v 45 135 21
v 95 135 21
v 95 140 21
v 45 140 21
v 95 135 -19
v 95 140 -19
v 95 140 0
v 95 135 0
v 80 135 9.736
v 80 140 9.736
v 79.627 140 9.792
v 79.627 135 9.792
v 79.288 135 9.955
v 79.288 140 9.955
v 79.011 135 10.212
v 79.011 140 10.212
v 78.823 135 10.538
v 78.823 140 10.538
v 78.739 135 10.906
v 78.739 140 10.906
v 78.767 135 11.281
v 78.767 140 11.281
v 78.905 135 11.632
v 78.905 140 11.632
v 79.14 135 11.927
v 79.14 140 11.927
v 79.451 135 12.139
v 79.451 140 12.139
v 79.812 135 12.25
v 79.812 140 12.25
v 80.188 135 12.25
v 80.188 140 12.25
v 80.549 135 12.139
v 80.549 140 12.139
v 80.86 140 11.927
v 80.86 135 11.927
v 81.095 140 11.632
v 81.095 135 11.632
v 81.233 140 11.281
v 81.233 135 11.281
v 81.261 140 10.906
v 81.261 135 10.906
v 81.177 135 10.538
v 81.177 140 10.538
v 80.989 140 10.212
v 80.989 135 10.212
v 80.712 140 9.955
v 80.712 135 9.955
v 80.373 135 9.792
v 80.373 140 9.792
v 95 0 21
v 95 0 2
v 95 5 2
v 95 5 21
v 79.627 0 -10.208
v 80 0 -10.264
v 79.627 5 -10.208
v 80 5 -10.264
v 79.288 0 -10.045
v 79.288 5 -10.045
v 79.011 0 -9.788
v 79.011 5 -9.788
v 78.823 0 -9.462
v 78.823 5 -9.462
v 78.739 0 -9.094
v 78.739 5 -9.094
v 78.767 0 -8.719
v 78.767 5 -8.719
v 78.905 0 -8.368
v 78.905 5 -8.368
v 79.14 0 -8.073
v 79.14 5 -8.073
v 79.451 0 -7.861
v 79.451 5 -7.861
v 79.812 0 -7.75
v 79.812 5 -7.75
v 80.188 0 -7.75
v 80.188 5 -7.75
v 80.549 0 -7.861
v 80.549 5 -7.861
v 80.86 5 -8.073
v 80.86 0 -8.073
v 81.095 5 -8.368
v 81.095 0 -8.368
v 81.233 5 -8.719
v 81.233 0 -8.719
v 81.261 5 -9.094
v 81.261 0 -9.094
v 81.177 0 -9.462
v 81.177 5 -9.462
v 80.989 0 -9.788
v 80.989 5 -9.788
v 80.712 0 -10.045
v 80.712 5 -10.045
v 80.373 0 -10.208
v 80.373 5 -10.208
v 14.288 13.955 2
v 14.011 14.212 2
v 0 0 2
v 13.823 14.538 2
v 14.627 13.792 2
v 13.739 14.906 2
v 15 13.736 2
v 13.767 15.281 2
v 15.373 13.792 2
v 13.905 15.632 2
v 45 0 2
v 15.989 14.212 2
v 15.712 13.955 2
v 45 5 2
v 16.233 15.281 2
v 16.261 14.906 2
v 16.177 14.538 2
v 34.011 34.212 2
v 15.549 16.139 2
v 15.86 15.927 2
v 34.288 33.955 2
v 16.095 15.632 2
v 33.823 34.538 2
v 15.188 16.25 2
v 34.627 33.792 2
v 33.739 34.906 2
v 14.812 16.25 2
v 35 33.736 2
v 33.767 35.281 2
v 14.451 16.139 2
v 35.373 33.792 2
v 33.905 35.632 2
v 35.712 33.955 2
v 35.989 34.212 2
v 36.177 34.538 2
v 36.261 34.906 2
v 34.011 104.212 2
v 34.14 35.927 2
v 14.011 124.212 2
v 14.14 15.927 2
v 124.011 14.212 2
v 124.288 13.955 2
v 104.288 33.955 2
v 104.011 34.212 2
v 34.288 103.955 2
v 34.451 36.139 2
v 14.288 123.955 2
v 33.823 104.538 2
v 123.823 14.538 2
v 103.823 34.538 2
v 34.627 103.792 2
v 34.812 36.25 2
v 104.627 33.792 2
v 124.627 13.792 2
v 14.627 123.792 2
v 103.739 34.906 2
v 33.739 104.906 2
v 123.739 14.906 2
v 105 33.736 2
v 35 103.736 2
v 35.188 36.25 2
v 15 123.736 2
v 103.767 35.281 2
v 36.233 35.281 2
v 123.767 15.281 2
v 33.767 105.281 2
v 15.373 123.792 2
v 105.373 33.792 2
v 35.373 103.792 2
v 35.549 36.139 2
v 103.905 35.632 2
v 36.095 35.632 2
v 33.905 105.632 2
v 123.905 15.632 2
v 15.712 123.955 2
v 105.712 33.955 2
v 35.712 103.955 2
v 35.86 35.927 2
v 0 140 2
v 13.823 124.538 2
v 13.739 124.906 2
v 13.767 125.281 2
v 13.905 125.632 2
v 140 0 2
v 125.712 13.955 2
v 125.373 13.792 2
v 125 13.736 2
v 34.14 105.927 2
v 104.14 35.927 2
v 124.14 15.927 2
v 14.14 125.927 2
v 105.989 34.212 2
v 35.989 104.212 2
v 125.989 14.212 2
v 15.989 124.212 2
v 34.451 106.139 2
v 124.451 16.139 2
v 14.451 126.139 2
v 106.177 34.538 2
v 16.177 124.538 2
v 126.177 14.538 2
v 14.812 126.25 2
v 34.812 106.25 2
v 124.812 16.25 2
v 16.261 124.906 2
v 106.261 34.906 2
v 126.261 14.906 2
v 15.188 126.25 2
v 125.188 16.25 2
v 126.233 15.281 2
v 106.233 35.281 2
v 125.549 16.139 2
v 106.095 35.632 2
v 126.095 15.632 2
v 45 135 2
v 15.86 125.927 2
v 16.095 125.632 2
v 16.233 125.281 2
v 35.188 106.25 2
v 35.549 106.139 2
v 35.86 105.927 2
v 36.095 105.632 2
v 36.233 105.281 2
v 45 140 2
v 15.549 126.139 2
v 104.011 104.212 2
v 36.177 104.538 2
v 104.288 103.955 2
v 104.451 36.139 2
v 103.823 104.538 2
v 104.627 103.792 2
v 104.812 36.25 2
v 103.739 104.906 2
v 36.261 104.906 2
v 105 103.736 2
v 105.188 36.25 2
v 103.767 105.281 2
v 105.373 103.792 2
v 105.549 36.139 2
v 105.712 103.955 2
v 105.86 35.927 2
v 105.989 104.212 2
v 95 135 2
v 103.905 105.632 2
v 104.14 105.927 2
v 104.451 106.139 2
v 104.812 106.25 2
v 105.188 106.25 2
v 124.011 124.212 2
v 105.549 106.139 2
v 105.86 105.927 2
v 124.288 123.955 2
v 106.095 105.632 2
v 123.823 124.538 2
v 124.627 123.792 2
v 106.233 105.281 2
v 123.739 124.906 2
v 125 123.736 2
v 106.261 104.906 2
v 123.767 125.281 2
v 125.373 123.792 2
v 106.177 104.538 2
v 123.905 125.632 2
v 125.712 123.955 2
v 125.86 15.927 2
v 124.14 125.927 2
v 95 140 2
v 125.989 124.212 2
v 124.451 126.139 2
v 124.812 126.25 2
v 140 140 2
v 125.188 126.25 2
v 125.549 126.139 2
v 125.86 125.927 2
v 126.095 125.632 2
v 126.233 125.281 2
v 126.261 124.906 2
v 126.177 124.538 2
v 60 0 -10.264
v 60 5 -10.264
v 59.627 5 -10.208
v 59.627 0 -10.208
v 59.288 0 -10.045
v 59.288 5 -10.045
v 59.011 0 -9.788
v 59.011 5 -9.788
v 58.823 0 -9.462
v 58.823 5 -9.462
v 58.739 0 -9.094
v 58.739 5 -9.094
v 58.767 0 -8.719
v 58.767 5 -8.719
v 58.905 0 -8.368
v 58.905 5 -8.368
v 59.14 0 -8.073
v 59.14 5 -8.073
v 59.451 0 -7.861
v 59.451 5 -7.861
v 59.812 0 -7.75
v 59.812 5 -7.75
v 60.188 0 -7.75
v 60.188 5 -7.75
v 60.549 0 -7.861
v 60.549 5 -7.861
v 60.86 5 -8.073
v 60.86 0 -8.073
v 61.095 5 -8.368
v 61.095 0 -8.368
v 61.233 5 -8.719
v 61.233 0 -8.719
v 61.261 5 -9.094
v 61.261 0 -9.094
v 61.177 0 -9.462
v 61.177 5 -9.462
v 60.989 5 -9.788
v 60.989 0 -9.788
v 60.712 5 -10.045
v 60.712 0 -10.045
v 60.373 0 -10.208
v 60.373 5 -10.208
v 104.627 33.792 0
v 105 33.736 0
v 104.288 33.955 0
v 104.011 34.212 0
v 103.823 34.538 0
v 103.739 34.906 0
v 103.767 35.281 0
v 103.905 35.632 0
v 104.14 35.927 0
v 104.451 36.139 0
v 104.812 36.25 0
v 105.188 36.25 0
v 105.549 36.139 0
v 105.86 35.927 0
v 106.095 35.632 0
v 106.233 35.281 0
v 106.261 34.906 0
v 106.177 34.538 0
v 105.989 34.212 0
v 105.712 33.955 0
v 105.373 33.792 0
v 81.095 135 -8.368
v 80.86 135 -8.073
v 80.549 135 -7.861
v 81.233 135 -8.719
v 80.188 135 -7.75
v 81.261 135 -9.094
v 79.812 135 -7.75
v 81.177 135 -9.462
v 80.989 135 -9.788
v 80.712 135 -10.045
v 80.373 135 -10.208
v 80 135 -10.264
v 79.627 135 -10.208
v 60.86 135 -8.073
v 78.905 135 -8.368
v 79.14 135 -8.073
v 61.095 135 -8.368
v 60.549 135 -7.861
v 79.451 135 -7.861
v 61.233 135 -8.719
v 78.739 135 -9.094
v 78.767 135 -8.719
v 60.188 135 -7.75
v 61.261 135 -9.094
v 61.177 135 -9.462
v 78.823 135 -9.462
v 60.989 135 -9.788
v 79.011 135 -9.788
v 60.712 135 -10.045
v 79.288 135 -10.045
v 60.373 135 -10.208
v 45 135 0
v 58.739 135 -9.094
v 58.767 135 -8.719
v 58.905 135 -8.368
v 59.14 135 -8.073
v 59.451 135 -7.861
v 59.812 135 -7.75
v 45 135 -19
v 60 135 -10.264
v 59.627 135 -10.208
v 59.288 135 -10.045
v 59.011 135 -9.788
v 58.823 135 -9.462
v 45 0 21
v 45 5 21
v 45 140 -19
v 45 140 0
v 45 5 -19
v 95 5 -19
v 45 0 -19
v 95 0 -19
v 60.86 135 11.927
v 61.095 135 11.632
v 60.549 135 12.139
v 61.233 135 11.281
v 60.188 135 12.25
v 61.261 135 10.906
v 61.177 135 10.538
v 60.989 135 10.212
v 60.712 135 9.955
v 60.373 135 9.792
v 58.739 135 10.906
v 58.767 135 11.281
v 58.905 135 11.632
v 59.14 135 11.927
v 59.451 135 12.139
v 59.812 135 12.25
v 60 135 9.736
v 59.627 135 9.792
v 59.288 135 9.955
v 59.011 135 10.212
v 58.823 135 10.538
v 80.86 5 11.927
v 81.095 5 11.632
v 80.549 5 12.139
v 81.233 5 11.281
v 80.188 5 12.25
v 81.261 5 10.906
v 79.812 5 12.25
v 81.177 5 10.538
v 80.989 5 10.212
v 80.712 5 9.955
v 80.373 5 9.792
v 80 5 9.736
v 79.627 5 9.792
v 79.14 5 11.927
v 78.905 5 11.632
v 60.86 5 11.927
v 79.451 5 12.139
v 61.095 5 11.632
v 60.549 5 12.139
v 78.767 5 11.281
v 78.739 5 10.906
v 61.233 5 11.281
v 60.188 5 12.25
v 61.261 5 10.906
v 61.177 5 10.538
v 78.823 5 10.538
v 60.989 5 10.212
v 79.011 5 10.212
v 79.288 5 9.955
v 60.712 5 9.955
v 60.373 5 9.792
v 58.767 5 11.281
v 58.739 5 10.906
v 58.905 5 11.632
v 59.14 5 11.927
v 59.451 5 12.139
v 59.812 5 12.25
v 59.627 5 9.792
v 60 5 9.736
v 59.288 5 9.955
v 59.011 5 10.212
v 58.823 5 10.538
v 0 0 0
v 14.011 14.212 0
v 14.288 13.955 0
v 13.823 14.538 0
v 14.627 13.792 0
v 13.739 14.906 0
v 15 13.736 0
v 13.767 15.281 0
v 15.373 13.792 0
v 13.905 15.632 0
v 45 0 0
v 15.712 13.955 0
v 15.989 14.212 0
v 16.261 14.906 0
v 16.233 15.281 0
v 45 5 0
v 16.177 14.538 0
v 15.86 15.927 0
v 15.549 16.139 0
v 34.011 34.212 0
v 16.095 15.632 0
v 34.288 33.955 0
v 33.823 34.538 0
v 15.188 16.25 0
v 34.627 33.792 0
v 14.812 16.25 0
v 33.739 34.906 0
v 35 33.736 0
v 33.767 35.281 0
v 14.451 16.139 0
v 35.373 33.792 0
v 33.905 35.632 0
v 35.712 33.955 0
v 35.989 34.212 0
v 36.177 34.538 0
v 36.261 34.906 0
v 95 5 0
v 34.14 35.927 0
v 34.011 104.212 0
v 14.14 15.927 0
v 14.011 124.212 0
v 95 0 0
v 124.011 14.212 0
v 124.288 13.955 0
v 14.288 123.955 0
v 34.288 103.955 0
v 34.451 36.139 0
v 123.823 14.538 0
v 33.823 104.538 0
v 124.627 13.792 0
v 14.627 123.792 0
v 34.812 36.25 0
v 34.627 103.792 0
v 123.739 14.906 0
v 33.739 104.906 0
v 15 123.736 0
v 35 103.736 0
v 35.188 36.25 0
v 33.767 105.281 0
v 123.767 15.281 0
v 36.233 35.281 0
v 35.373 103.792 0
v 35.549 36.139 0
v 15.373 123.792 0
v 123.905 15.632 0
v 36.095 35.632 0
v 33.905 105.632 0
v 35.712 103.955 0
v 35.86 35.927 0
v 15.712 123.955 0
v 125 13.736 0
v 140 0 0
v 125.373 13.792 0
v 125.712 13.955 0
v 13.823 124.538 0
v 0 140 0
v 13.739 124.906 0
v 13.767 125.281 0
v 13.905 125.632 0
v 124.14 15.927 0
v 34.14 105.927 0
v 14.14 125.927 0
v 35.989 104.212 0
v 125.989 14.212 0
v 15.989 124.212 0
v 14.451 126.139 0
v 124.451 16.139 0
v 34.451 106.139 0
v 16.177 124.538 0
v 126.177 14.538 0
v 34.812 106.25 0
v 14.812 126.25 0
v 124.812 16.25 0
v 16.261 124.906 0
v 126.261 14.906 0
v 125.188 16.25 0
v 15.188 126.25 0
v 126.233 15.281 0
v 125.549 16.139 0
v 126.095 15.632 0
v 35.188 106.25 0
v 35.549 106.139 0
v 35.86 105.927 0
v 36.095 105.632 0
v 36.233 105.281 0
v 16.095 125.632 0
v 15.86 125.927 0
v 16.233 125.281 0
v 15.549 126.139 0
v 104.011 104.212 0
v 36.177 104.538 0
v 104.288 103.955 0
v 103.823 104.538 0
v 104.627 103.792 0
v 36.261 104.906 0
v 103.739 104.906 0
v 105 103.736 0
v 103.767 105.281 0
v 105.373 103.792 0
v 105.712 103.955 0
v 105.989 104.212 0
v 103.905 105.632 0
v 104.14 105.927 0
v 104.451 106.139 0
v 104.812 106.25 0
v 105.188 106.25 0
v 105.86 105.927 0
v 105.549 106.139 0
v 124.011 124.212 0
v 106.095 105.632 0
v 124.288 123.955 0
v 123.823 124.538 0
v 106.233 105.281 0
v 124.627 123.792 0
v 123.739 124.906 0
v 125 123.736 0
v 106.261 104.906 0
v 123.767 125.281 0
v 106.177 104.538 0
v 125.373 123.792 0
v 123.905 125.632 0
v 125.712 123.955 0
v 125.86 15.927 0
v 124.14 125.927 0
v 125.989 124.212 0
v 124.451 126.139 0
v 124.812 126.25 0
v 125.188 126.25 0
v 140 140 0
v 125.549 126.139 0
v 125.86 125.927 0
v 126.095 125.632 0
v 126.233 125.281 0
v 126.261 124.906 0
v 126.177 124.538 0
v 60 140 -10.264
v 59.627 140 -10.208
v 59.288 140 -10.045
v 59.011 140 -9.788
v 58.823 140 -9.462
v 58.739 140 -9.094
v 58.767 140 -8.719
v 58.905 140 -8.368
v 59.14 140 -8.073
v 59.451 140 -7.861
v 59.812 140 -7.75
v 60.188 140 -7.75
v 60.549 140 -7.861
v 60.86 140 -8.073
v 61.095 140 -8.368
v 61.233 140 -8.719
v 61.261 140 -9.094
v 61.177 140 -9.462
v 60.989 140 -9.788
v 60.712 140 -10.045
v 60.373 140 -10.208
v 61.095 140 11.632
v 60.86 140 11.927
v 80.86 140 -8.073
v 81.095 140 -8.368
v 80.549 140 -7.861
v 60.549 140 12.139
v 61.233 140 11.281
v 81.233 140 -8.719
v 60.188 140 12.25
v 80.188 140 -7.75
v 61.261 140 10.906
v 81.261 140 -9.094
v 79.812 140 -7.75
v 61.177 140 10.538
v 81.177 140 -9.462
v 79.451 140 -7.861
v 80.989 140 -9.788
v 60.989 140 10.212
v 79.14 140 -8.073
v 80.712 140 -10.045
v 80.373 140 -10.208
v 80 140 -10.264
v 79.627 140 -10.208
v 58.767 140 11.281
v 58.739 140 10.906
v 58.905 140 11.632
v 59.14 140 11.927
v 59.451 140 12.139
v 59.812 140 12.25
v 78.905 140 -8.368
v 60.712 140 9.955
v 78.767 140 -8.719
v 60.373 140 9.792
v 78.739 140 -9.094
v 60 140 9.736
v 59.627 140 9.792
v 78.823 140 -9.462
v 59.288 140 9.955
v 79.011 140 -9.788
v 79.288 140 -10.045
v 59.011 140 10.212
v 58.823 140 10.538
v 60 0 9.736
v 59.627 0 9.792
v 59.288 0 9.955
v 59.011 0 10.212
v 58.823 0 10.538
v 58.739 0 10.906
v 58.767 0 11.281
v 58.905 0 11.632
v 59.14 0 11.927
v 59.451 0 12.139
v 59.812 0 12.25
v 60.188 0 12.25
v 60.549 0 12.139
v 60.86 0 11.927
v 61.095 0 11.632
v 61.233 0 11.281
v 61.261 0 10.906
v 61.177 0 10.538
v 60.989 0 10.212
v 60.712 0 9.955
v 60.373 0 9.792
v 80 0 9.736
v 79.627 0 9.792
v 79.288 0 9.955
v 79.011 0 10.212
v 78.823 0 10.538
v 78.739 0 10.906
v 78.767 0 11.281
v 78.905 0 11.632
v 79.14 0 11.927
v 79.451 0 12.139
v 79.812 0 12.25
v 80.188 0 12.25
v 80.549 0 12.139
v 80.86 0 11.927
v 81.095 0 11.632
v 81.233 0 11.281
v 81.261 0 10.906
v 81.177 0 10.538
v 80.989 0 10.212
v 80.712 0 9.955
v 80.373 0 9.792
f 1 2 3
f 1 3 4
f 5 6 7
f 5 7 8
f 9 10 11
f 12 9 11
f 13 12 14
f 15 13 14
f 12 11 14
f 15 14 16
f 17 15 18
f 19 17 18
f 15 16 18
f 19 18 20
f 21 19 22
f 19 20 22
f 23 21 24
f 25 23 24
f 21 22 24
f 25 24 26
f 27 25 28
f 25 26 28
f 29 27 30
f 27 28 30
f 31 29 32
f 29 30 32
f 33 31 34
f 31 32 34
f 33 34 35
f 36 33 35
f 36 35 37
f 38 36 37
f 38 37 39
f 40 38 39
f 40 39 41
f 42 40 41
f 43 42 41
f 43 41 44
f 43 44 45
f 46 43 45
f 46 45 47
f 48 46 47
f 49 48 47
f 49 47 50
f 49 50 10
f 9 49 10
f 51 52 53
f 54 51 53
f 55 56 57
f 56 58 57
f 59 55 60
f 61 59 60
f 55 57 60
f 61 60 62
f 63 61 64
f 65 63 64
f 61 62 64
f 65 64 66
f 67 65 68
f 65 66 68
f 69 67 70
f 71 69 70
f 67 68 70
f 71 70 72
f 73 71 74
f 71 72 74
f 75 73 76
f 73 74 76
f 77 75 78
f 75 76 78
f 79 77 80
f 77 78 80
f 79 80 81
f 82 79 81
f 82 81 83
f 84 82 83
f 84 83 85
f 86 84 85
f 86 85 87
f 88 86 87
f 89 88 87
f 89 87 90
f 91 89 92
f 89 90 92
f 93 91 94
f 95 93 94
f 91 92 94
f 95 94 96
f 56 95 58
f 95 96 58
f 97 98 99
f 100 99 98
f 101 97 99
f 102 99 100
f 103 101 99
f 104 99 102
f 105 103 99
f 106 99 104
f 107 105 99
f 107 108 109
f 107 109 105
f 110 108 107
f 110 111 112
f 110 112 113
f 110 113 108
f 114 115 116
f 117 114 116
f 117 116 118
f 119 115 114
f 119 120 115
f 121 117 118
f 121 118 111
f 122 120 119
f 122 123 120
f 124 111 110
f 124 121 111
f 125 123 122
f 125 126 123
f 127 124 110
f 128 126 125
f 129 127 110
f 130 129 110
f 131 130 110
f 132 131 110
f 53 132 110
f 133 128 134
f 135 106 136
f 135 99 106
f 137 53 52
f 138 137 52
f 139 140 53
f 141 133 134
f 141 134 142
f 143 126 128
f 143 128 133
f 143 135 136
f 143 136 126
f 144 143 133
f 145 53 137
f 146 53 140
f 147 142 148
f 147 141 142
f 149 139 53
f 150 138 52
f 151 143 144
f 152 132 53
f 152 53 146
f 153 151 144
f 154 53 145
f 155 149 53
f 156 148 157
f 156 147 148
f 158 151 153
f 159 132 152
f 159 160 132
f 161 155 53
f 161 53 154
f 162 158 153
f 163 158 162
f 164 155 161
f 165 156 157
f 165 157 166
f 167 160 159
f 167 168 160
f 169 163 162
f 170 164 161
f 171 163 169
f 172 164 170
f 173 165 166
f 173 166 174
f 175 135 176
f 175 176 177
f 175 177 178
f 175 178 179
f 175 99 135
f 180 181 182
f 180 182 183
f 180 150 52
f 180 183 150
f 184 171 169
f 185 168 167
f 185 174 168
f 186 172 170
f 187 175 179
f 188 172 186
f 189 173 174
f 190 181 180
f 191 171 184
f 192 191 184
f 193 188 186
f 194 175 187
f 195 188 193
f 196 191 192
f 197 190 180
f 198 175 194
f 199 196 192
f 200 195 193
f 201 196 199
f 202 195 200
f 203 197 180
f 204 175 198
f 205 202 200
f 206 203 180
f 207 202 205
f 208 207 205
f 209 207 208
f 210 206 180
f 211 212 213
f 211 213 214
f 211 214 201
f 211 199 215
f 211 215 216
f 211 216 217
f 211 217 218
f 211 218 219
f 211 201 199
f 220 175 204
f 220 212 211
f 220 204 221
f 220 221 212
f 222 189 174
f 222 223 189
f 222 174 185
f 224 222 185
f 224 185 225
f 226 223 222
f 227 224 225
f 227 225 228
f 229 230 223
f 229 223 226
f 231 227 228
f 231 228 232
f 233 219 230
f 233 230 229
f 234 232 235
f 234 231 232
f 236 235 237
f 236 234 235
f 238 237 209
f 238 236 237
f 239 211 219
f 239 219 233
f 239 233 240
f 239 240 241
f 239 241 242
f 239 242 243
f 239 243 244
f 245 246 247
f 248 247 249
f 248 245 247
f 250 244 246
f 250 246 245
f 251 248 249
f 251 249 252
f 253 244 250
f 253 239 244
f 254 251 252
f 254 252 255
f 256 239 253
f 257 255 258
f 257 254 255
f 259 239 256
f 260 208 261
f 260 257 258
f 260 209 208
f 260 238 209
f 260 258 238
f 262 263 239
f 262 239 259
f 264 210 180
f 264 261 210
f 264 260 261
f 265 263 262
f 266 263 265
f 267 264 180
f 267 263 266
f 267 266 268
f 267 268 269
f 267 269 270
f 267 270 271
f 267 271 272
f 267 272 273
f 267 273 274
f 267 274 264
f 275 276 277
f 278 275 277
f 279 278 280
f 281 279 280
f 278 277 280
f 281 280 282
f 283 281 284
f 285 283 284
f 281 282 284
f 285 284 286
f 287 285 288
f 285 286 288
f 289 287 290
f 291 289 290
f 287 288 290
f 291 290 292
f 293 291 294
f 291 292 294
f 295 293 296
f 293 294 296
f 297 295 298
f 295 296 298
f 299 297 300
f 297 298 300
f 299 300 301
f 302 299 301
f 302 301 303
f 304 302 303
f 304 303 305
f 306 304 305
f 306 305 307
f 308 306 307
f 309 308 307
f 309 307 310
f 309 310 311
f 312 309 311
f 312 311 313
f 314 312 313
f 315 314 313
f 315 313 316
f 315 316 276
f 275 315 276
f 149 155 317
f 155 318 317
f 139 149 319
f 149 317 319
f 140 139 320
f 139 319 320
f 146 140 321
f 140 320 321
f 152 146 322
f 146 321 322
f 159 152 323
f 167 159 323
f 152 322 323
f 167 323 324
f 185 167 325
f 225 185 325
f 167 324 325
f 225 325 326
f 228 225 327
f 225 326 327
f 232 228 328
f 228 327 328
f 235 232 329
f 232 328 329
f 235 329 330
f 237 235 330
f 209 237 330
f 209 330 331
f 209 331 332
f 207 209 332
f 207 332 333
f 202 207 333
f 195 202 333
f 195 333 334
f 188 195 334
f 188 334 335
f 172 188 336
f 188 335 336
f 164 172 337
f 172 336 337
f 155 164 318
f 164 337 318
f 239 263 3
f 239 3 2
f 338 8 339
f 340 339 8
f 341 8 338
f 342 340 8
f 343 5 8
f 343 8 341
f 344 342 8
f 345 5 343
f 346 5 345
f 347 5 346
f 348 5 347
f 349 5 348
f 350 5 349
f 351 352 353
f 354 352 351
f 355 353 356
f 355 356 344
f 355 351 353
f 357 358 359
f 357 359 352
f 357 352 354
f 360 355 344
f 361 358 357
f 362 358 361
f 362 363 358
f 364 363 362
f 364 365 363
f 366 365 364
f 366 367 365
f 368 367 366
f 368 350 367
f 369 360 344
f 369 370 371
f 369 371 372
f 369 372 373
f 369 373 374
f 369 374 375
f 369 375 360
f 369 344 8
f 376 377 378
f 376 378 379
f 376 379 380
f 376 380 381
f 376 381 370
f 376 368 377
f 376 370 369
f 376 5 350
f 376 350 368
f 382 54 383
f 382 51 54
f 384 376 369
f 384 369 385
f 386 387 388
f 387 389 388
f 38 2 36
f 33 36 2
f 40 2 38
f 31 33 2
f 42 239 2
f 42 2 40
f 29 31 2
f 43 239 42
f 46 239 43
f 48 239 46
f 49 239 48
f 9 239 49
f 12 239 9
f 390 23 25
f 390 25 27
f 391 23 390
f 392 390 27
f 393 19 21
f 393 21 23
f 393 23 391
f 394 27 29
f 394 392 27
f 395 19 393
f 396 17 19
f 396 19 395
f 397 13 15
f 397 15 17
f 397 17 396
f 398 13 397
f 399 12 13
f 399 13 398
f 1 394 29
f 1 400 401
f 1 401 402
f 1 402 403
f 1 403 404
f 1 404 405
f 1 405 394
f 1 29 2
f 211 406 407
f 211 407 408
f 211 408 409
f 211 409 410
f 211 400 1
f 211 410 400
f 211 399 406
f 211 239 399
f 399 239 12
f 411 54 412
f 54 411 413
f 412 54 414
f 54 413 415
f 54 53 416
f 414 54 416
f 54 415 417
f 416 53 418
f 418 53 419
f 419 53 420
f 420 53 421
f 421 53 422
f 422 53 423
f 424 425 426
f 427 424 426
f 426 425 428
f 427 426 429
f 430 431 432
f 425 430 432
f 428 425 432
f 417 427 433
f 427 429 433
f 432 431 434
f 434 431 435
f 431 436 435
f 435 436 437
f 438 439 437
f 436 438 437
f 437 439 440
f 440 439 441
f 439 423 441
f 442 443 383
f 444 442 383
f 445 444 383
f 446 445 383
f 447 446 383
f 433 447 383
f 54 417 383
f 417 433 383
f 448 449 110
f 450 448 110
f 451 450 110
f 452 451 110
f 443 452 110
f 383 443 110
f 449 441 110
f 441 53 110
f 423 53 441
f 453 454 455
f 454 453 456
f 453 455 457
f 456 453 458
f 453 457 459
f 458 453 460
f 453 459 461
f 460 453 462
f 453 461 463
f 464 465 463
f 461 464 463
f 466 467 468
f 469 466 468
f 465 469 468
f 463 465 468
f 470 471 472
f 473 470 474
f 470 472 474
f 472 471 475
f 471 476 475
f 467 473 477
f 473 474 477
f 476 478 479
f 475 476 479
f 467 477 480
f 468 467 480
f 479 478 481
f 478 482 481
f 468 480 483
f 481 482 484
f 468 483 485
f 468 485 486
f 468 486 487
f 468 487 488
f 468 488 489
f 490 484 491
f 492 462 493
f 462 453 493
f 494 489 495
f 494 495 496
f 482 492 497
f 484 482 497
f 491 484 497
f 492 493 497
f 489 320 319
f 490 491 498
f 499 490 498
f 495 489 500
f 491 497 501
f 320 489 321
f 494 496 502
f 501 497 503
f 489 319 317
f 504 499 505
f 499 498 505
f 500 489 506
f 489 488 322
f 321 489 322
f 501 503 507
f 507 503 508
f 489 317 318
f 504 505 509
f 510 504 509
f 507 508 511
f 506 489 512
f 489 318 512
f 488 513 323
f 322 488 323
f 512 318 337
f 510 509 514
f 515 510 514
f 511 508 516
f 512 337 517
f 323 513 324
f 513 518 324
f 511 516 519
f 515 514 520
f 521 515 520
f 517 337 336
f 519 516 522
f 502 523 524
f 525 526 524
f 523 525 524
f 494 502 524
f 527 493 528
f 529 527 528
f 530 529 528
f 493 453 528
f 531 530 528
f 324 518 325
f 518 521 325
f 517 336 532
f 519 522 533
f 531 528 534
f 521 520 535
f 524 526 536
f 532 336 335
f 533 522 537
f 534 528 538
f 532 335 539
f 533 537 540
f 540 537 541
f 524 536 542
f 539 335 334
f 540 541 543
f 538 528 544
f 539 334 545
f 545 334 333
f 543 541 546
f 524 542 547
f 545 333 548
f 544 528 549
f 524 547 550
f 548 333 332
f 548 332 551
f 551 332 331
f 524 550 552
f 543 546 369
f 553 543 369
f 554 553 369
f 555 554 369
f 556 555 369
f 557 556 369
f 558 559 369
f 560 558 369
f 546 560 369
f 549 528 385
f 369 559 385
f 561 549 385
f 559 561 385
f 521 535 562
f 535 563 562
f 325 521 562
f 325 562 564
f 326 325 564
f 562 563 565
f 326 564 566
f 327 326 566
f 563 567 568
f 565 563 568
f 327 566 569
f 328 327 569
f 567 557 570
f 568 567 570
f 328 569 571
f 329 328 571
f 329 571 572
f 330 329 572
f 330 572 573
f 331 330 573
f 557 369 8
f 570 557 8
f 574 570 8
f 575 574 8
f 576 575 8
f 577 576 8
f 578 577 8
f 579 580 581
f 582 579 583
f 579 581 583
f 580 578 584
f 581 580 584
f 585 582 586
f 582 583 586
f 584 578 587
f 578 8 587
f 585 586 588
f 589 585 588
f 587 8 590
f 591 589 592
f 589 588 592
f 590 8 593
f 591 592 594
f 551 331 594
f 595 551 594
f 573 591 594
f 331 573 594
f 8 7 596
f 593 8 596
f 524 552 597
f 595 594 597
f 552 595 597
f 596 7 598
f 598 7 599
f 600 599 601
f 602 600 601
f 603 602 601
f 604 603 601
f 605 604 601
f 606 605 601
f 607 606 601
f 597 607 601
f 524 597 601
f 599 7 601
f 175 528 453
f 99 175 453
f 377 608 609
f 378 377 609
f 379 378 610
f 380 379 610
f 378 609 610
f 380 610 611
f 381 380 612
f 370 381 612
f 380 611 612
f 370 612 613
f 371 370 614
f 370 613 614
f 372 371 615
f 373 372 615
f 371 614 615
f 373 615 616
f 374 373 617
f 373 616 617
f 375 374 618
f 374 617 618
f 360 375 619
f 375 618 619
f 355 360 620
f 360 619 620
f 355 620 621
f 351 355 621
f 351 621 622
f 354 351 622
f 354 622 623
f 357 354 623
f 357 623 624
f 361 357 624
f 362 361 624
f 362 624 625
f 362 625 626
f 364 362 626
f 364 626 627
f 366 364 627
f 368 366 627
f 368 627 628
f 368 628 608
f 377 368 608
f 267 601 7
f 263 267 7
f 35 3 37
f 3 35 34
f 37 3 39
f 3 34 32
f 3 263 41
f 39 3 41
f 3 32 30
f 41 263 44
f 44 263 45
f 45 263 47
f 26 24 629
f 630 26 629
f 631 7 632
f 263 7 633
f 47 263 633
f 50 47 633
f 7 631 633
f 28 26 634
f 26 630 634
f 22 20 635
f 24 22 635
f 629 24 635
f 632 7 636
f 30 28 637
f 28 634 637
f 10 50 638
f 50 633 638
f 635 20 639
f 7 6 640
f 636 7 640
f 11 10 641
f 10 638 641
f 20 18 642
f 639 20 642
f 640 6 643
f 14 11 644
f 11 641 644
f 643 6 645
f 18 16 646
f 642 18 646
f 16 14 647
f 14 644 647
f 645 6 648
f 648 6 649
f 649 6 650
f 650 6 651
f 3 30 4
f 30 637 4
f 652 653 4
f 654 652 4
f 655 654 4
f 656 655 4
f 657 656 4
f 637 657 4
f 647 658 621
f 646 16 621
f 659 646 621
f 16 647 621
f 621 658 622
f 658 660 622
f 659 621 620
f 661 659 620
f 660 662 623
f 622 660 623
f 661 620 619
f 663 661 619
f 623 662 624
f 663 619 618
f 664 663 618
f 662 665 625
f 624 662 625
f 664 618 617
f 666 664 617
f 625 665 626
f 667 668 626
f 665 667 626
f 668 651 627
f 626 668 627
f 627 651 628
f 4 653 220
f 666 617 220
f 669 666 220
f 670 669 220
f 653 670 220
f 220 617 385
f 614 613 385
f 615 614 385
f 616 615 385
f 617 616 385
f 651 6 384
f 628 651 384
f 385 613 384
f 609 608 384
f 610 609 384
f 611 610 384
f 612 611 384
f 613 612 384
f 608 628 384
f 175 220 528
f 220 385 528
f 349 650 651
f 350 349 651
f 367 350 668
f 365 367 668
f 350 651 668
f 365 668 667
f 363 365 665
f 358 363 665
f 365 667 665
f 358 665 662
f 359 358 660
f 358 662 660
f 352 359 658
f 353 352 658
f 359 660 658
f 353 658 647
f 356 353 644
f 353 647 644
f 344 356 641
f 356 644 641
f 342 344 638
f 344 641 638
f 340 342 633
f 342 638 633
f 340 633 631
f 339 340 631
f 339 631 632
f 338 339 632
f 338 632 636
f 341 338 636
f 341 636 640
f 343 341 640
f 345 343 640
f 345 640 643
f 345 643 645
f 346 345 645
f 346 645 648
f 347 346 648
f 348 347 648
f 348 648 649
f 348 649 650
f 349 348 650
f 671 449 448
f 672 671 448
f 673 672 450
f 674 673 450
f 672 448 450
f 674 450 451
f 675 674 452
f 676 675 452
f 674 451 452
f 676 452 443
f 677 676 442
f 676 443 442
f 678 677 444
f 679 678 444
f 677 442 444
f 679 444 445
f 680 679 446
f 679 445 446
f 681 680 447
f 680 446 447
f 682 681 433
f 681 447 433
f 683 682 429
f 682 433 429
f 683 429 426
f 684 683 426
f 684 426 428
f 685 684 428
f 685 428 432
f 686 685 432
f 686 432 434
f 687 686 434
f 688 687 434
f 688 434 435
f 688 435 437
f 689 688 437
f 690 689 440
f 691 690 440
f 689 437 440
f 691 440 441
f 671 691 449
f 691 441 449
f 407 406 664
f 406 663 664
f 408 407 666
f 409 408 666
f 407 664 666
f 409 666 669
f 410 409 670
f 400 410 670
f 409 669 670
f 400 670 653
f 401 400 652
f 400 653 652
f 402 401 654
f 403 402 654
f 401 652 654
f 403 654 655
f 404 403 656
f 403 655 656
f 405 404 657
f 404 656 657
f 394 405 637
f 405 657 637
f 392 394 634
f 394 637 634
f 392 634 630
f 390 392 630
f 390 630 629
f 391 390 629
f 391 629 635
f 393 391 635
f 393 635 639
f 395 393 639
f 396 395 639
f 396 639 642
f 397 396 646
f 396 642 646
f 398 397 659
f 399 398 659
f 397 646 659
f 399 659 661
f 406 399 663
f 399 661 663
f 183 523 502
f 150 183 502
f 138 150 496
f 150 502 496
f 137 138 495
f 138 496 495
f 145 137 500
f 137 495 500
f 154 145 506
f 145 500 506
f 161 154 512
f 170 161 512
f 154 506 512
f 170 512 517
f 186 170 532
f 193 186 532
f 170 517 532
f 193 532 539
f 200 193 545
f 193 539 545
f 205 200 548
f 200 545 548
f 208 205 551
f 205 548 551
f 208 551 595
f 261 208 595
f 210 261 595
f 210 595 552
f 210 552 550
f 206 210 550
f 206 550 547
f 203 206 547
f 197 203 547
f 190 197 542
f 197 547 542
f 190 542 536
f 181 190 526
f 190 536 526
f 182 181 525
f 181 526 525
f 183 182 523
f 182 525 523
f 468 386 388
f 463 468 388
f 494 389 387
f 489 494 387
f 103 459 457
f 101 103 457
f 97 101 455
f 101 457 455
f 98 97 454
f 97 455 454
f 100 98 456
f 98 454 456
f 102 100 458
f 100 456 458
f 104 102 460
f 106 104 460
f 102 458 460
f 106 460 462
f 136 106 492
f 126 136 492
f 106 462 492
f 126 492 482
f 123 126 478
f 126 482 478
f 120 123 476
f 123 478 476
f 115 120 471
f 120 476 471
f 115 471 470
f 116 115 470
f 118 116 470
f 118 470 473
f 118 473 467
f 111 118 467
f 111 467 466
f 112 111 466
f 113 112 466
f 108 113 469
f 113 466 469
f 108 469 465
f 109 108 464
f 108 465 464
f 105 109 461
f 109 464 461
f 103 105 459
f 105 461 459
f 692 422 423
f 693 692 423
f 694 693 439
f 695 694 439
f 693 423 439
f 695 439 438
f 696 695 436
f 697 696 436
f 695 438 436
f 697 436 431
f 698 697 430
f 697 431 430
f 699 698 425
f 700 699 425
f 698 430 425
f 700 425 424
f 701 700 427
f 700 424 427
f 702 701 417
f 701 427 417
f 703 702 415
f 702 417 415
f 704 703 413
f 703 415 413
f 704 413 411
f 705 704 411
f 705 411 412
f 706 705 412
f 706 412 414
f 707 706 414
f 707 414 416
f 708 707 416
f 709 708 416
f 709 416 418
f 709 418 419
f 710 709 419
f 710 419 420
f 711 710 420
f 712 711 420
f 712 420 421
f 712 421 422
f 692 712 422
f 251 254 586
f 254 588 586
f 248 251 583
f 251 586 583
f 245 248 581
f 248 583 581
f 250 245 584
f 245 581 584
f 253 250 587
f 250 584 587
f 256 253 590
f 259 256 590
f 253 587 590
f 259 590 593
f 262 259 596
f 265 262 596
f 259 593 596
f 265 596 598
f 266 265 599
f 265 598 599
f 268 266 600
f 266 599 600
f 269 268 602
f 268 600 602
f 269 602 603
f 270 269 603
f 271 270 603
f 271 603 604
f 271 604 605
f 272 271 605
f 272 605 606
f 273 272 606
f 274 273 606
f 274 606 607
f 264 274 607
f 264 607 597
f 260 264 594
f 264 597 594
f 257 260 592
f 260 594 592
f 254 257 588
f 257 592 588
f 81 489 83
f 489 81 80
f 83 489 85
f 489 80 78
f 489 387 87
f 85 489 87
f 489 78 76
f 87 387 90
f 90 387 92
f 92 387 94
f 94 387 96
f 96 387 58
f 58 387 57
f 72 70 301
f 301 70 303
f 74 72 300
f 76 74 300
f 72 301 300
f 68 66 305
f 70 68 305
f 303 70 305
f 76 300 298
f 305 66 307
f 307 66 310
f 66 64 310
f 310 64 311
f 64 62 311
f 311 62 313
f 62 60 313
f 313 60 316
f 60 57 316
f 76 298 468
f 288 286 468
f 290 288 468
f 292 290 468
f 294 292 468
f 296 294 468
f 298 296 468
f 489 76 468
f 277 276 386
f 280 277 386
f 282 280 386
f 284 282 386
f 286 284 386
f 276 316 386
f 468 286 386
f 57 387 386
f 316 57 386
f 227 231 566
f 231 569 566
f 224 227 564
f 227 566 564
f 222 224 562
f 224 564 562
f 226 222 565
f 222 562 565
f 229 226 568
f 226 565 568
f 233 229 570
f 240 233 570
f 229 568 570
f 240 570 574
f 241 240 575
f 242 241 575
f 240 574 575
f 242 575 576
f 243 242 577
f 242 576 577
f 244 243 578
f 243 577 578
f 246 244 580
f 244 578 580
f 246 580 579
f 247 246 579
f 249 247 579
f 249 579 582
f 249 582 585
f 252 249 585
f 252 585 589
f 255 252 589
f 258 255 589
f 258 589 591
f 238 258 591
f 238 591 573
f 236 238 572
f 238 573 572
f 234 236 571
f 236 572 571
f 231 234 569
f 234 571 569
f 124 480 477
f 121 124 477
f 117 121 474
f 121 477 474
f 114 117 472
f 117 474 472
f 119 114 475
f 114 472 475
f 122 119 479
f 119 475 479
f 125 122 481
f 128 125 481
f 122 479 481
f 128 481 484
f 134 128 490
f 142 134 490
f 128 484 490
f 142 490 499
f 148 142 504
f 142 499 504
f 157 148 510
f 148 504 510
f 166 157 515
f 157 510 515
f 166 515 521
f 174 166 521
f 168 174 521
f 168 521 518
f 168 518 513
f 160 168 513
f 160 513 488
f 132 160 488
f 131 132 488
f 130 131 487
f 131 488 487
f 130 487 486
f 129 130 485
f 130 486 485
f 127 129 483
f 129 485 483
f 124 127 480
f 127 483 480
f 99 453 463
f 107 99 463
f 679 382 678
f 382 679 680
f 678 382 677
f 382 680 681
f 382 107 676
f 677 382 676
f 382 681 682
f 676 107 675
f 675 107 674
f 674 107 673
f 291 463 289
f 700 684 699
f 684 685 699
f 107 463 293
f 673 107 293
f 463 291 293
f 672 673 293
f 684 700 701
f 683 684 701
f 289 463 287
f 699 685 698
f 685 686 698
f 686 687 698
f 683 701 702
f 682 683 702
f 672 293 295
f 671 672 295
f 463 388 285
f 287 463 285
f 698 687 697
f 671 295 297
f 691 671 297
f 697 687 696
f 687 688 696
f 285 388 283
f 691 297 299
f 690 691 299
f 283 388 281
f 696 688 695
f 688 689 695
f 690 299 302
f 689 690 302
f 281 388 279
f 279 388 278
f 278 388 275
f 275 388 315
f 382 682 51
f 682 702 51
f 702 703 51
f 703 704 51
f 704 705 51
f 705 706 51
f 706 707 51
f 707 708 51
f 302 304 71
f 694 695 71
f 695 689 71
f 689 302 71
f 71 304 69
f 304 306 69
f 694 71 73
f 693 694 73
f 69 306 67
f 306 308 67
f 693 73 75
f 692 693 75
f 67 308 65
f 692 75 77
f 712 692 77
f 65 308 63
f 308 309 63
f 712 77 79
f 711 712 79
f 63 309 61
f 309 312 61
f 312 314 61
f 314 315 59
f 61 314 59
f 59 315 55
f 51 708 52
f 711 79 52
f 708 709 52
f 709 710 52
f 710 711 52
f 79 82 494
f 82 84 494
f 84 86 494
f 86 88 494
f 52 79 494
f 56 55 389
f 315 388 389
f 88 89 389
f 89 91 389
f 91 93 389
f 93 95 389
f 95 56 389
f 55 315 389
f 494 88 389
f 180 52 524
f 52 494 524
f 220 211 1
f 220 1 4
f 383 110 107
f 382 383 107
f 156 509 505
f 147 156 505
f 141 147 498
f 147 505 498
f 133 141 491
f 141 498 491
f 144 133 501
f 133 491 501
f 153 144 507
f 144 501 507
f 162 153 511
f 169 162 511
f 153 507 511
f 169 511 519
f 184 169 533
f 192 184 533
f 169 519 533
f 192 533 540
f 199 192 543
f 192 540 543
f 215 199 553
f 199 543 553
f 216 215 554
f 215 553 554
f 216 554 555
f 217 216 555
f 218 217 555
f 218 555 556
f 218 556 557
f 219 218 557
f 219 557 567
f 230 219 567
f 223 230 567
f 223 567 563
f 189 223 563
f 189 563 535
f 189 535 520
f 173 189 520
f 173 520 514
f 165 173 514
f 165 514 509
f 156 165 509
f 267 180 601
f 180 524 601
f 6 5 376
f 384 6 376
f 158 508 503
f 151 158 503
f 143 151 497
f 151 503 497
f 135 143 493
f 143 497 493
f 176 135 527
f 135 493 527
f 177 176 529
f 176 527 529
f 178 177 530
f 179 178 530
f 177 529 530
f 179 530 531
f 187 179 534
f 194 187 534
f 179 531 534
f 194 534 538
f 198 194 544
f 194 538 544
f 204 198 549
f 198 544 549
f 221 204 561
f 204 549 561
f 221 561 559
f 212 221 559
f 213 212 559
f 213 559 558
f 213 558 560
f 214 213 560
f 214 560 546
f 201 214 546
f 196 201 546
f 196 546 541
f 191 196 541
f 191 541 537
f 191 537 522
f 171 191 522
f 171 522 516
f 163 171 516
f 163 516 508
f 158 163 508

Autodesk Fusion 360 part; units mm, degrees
sketch "Sketch1" plane through (0, 0, 0) normal (0, 0, 1) x (1, 0, 0)
  line L0 (0, 0) -> (140, 0)
  line L1 (140, 0) -> (140, 140)
  line L2 (140, 140) -> (0, 140)
  line L3 (0, 140) -> (0, 0)
  dimension "d1" = 140
  dimension "d2" = 140
extrude "Extrude1" add sketch "Sketch1" along normal blind 2
sketch "Sketch2" plane through (0, 0, 2) normal (0, 0, 1) x (-1, 0, 0)
  line L0 (0, -140) -> (0, 0)
  line L1 (0, 0) -> (-140, 0)
  line L2 (-140, 0) -> (-140, -140)
  line L3 (-140, -140) -> (0, -140)
  line L4 (-45, 0) -> (-95, 0)
  line L5 (-95, 0) -> (-95, -5)
  line L6 (-95, -5) -> (-45, -5)
  line L7 (-45, -5) -> (-45, 0)
  line L8 (-45, -140) -> (-95, -140)
  line L9 (-95, -140) -> (-95, -135)
  line L10 (-95, -135) -> (-45, -135)
  line L11 (-45, -135) -> (-45, -140)
  dimension "d5" = 45
  dimension "d6" = 45
  dimension "d7" = 5
  dimension "d8" = 50
  dimension "d9" = 5
  dimension "d10" = 45
extrude "Extrude2" add sketch "Sketch2" along normal blind 19 and the other way blind 21 contours L3 L8 L9 L10 L11 | L1 L4 L5 L6 L7
sketch "Sketch3" plane through (0, 0, 0) normal (0, -1, 0) x (1, 0, 0)
  line L0 (45, 2) -> (0, 2)
  line L1 (0, 2) -> (0, 0)
  line L2 (0, 0) -> (45, 0)
  line L3 (45, 0) -> (45, -19)
  line L4 (45, -19) -> (95, -19)
  line L5 (95, -19) -> (95, 0)
  line L6 (95, 0) -> (140, 0)
  line L7 (140, 0) -> (140, 2)
  line L8 (140, 2) -> (95, 2)
  line L9 (95, 2) -> (95, 21)
  line L10 (95, 21) -> (45, 21)
  line L11 (45, 21) -> (45, 2)
  line L12 (60, -9) -> (80, -9) construction
  line L13 (80, -9) -> (80, 11) construction
  line L14 (80, 11) -> (60, 11) construction
  line L15 (60, 11) -> (60, -9) construction
  circle A0 centre (60, 11) radius 1.5
  circle A1 centre (80, 11) radius 1.5
  circle A2 centre (60, -9) radius 1.5
  circle A3 centre (80, -9) radius 1.5
  dimension "d15" = 20
  dimension "d16" = 20
  dimension "d17" = 10
  dimension "d18" = 15
  dimension "d19" = 3
  dimension "d20" = 3
  dimension "d21" = 3
  dimension "d22" = 3
hole "Hole1" at (60, 0, 11) at (80, 0, 11) at (60, 0, -9) at (80, 0, -9) direction (0, 1, 0) diameter 2.529 depth 140 tip angle 118
sketch "Sketch4" plane through (0, 0, 2) normal (0, 0, 1) x (-1, 0, 0)
  line L0 (-45, 0) -> (-45, -5)
  line L1 (-45, -5) -> (-95, -5)
  line L2 (-95, -5) -> (-95, 0)
  line L3 (-95, 0) -> (-140, 0)
  line L4 (-140, 0) -> (-140, -140)
  line L5 (-140, -140) -> (-95, -140)
  line L6 (-95, -140) -> (-95, -135)
  line L7 (-95, -135) -> (-45, -135)
  line L8 (-45, -135) -> (-45, -140)
  line L9 (-45, -140) -> (0, -140)
  line L10 (0, -140) -> (0, 0)
  line L11 (0, 0) -> (-45, 0)
  line L12 (-15, -15) -> (-125, -15) construction
  line L13 (-125, -15) -> (-125, -125) construction
  line L14 (-125, -125) -> (-15, -125) construction
  line L15 (-15, -125) -> (-15, -15) construction
  line L16 (-105, -35) -> (-105, -105) construction
  line L17 (-105, -105) -> (-35, -105) construction
  line L18 (-35, -105) -> (-35, -35) construction
  line L19 (-35, -35) -> (-105, -35) construction
  circle A0 centre (-15, -125) radius 1.5
  circle A1 centre (-125, -125) radius 1.5
  circle A2 centre (-35, -105) radius 1.5
  circle A3 centre (-105, -105) radius 1.5
  circle A4 centre (-105, -35) radius 1.5
  circle A5 centre (-35, -35) radius 1.5
  circle A6 centre (-15, -15) radius 1.5
  circle A7 centre (-125, -15) radius 1.5
  dimension "d28" = -20
  dimension "d29" = 3
  dimension "d30" = 3
  dimension "d31" = 3
  dimension "d32" = 3
  dimension "d33" = 3
  dimension "d34" = 3
  dimension "d35" = 3
  dimension "d36" = 3
hole "Hole2" at (15, 125, 2) at (125, 125, 2) at (105, 105, 2) at (35, 105, 2) at (35, 35, 2) at (125, 15, 2) at (105, 35, 2) at (15, 15, 2) direction (0, 0, -1) diameter 2.529 depth 2 tip angle 118
